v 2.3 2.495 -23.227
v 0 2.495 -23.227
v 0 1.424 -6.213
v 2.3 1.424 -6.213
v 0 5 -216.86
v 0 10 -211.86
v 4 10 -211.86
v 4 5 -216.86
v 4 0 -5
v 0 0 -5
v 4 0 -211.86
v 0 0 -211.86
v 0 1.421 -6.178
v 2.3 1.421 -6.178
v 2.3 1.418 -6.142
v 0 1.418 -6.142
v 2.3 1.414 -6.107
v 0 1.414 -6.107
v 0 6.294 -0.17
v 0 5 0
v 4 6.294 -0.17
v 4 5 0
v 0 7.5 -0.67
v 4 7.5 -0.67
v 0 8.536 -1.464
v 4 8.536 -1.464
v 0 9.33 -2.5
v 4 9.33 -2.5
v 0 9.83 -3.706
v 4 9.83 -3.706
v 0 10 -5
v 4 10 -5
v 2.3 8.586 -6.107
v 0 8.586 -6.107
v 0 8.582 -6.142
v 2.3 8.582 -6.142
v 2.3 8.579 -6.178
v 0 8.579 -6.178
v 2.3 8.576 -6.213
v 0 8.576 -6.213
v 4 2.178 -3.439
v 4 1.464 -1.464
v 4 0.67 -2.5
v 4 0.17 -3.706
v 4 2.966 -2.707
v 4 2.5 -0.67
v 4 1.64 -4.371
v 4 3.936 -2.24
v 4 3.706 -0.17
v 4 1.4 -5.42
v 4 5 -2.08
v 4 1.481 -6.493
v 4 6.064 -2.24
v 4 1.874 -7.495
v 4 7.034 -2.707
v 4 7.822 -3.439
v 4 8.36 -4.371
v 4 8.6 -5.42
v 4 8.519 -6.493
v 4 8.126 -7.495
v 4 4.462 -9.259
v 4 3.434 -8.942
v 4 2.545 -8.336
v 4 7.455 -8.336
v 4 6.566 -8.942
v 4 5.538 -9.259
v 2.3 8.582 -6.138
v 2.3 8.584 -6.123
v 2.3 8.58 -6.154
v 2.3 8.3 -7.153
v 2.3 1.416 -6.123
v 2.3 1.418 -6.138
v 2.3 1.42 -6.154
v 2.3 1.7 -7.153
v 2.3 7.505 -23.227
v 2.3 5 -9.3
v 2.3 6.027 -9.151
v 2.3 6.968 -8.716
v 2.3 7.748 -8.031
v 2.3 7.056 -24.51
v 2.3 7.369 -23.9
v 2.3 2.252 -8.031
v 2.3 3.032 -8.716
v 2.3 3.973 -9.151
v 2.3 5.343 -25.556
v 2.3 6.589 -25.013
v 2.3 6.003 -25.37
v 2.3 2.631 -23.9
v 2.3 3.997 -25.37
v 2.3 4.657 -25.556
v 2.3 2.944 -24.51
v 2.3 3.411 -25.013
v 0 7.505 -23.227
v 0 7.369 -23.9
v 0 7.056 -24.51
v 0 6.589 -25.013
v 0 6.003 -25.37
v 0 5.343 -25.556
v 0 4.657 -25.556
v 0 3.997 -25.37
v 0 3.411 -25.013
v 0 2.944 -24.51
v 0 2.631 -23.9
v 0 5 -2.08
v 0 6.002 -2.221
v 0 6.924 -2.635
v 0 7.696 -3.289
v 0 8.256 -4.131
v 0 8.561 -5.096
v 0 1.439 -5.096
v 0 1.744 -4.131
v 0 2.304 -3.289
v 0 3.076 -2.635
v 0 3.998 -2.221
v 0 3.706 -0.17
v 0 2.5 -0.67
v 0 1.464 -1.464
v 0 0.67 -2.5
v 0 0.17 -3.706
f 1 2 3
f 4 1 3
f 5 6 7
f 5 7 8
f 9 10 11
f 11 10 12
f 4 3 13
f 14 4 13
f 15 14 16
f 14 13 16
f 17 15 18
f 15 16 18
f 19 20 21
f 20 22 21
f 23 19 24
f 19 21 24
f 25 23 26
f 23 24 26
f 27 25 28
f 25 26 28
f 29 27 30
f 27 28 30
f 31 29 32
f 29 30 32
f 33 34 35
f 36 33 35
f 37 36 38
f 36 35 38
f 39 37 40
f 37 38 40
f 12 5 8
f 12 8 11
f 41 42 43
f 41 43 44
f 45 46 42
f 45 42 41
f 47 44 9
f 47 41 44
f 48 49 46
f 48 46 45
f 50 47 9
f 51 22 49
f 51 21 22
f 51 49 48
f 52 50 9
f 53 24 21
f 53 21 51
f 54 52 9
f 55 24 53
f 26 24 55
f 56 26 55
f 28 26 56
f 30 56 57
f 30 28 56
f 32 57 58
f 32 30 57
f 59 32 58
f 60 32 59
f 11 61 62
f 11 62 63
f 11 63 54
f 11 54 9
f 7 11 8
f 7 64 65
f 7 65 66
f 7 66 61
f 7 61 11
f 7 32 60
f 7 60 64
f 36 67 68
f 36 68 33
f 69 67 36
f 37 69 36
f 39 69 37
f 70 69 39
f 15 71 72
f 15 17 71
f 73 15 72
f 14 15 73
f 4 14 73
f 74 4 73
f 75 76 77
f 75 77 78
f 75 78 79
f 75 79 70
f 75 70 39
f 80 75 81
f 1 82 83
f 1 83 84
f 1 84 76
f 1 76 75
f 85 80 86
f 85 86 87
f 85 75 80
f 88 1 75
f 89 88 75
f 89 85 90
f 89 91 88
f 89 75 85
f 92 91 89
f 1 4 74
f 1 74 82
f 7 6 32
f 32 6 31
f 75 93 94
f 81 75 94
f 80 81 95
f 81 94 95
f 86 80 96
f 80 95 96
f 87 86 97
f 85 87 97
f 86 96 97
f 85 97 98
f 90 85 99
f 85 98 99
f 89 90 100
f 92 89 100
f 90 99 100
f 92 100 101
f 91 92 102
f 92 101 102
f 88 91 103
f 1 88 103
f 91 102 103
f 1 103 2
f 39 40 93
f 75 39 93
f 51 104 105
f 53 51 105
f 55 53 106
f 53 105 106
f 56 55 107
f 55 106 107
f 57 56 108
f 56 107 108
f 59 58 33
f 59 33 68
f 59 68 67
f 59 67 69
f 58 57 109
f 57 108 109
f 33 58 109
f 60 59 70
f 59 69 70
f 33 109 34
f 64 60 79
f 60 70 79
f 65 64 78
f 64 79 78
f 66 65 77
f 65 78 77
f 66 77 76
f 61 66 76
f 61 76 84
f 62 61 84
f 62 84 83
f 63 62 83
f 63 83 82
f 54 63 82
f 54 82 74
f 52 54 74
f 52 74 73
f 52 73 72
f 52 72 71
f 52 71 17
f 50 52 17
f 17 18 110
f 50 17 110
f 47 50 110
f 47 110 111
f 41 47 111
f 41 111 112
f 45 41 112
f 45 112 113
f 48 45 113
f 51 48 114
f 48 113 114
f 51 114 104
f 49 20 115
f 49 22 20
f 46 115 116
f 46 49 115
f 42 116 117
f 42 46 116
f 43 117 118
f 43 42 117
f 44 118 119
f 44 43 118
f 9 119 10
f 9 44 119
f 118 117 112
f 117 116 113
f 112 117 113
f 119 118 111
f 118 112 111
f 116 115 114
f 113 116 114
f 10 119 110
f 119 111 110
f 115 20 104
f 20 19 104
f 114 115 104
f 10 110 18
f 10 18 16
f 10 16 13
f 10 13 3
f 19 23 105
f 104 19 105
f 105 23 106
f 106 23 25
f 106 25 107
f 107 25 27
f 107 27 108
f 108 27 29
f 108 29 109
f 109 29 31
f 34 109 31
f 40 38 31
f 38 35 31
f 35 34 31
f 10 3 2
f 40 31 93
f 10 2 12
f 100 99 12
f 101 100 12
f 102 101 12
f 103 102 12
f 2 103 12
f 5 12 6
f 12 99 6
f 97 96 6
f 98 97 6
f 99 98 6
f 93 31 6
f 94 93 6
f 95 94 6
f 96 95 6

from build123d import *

# Parameters (mm, degrees)
SKETCH1_W           = 191.86
SKETCH1_H           = 10
BOSS_EXTRUDE1_DEPTH = 4
SKETCH7_R           = 3.61
CUT_EXTRUDE1_DEPTH  = 218.127288934
CUT_EXTRUDE2_DEPTH  = 2.3
FILLET1_R           = 5
FILLET2_R           = 2


# Some blends are built 0.0001 mm under size
with BuildPart() as part:
    # Sketch1 → Boss-Extrude1 (new body)
    with BuildSketch(Plane(origin=(0, 0, 0), x_dir=(0, 0, -1), z_dir=(1, 0, 0))):
        with Locations((95.93, 5)):
            Rectangle(SKETCH1_W, SKETCH1_H)
        Polygon((211.86, 0), (191.86, 0), (191.86, 10), (211.86, 10), (216.86, 5), align=None)
    extrude(amount=BOSS_EXTRUDE1_DEPTH)

    # Sketch7 → Cut-Extrude1 (cut, through all)
    with BuildSketch(Plane.ZY):
        with Locations((-5.6896, 5)):
            Circle(SKETCH7_R)
    extrude(amount=-CUT_EXTRUDE1_DEPTH, mode=Mode.SUBTRACT)

    # Sketch7<3> → Cut-Extrude2 (cut)
    with BuildSketch(Plane.ZY):
        with BuildLine():
            ThreePointArc((-6.154035141, 1.42), (-9.2996, 5), (-6.154035141, 8.58))
            Line((-6.154035141, 8.58), (-23.227363545, 7.505))
            ThreePointArc((-23.227363545, 7.505), (-25.5796, 5), (-23.227363545, 2.495))
            Line((-23.227363545, 2.495), (-6.154035141, 1.42))
        make_face()
    extrude(amount=-CUT_EXTRUDE2_DEPTH, mode=Mode.SUBTRACT)

    # Fillet1
    fillet1_edges = [part.edges().sort_by_distance(p)[0] for p in [
        (2, 10, 0),
        (2, 0, 0),
    ]]
    fillet(fillet1_edges, radius=FILLET1_R - 0.0001)  # a hair under: the kernel refuses the full size

    # Fillet2
    # the kernel refuses this fillet: 2 mm, written as the material it takes off along each edge
    with BuildSketch(Plane(origin=(-0.147213915, 1.42, -6.154035141), x_dir=(0, -0.12216150848858905, 0.9925102346292417), z_dir=(1, 0, 0))) as fillet2_piece_1:
        with BuildLine():
            CenterArc((0.060321863, 1.999957195), FILLET2_R, 266.585932682, 3.039206924)
            Line((-0.058781058, 0.003506721), (0, 0))
            ThreePointArc((0, 0), (0.02361843, 7.7263e-05), (0.04723686, 0))
        make_face()
    extrude(amount=2.447213915, mode=Mode.SUBTRACT)
    with BuildSketch(Plane(origin=(-0.147213915, 8.58, -6.154035141), x_dir=(0, 0.12216150848853974, 0.9925102346292478), z_dir=(1, 0, 0))) as fillet2_piece_2:
        with BuildLine():
            CenterArc((0.060321863, -1.999957195), FILLET2_R, 90.374860394, 3.039206924)
            Line((-0.058781058, -0.003506721), (0, 0))
            ThreePointArc((0, 0), (0.02361843, -7.7263e-05), (0.04723686, 0))
        make_face()
    extrude(amount=2.447213915, mode=Mode.SUBTRACT)


solid = part.part
